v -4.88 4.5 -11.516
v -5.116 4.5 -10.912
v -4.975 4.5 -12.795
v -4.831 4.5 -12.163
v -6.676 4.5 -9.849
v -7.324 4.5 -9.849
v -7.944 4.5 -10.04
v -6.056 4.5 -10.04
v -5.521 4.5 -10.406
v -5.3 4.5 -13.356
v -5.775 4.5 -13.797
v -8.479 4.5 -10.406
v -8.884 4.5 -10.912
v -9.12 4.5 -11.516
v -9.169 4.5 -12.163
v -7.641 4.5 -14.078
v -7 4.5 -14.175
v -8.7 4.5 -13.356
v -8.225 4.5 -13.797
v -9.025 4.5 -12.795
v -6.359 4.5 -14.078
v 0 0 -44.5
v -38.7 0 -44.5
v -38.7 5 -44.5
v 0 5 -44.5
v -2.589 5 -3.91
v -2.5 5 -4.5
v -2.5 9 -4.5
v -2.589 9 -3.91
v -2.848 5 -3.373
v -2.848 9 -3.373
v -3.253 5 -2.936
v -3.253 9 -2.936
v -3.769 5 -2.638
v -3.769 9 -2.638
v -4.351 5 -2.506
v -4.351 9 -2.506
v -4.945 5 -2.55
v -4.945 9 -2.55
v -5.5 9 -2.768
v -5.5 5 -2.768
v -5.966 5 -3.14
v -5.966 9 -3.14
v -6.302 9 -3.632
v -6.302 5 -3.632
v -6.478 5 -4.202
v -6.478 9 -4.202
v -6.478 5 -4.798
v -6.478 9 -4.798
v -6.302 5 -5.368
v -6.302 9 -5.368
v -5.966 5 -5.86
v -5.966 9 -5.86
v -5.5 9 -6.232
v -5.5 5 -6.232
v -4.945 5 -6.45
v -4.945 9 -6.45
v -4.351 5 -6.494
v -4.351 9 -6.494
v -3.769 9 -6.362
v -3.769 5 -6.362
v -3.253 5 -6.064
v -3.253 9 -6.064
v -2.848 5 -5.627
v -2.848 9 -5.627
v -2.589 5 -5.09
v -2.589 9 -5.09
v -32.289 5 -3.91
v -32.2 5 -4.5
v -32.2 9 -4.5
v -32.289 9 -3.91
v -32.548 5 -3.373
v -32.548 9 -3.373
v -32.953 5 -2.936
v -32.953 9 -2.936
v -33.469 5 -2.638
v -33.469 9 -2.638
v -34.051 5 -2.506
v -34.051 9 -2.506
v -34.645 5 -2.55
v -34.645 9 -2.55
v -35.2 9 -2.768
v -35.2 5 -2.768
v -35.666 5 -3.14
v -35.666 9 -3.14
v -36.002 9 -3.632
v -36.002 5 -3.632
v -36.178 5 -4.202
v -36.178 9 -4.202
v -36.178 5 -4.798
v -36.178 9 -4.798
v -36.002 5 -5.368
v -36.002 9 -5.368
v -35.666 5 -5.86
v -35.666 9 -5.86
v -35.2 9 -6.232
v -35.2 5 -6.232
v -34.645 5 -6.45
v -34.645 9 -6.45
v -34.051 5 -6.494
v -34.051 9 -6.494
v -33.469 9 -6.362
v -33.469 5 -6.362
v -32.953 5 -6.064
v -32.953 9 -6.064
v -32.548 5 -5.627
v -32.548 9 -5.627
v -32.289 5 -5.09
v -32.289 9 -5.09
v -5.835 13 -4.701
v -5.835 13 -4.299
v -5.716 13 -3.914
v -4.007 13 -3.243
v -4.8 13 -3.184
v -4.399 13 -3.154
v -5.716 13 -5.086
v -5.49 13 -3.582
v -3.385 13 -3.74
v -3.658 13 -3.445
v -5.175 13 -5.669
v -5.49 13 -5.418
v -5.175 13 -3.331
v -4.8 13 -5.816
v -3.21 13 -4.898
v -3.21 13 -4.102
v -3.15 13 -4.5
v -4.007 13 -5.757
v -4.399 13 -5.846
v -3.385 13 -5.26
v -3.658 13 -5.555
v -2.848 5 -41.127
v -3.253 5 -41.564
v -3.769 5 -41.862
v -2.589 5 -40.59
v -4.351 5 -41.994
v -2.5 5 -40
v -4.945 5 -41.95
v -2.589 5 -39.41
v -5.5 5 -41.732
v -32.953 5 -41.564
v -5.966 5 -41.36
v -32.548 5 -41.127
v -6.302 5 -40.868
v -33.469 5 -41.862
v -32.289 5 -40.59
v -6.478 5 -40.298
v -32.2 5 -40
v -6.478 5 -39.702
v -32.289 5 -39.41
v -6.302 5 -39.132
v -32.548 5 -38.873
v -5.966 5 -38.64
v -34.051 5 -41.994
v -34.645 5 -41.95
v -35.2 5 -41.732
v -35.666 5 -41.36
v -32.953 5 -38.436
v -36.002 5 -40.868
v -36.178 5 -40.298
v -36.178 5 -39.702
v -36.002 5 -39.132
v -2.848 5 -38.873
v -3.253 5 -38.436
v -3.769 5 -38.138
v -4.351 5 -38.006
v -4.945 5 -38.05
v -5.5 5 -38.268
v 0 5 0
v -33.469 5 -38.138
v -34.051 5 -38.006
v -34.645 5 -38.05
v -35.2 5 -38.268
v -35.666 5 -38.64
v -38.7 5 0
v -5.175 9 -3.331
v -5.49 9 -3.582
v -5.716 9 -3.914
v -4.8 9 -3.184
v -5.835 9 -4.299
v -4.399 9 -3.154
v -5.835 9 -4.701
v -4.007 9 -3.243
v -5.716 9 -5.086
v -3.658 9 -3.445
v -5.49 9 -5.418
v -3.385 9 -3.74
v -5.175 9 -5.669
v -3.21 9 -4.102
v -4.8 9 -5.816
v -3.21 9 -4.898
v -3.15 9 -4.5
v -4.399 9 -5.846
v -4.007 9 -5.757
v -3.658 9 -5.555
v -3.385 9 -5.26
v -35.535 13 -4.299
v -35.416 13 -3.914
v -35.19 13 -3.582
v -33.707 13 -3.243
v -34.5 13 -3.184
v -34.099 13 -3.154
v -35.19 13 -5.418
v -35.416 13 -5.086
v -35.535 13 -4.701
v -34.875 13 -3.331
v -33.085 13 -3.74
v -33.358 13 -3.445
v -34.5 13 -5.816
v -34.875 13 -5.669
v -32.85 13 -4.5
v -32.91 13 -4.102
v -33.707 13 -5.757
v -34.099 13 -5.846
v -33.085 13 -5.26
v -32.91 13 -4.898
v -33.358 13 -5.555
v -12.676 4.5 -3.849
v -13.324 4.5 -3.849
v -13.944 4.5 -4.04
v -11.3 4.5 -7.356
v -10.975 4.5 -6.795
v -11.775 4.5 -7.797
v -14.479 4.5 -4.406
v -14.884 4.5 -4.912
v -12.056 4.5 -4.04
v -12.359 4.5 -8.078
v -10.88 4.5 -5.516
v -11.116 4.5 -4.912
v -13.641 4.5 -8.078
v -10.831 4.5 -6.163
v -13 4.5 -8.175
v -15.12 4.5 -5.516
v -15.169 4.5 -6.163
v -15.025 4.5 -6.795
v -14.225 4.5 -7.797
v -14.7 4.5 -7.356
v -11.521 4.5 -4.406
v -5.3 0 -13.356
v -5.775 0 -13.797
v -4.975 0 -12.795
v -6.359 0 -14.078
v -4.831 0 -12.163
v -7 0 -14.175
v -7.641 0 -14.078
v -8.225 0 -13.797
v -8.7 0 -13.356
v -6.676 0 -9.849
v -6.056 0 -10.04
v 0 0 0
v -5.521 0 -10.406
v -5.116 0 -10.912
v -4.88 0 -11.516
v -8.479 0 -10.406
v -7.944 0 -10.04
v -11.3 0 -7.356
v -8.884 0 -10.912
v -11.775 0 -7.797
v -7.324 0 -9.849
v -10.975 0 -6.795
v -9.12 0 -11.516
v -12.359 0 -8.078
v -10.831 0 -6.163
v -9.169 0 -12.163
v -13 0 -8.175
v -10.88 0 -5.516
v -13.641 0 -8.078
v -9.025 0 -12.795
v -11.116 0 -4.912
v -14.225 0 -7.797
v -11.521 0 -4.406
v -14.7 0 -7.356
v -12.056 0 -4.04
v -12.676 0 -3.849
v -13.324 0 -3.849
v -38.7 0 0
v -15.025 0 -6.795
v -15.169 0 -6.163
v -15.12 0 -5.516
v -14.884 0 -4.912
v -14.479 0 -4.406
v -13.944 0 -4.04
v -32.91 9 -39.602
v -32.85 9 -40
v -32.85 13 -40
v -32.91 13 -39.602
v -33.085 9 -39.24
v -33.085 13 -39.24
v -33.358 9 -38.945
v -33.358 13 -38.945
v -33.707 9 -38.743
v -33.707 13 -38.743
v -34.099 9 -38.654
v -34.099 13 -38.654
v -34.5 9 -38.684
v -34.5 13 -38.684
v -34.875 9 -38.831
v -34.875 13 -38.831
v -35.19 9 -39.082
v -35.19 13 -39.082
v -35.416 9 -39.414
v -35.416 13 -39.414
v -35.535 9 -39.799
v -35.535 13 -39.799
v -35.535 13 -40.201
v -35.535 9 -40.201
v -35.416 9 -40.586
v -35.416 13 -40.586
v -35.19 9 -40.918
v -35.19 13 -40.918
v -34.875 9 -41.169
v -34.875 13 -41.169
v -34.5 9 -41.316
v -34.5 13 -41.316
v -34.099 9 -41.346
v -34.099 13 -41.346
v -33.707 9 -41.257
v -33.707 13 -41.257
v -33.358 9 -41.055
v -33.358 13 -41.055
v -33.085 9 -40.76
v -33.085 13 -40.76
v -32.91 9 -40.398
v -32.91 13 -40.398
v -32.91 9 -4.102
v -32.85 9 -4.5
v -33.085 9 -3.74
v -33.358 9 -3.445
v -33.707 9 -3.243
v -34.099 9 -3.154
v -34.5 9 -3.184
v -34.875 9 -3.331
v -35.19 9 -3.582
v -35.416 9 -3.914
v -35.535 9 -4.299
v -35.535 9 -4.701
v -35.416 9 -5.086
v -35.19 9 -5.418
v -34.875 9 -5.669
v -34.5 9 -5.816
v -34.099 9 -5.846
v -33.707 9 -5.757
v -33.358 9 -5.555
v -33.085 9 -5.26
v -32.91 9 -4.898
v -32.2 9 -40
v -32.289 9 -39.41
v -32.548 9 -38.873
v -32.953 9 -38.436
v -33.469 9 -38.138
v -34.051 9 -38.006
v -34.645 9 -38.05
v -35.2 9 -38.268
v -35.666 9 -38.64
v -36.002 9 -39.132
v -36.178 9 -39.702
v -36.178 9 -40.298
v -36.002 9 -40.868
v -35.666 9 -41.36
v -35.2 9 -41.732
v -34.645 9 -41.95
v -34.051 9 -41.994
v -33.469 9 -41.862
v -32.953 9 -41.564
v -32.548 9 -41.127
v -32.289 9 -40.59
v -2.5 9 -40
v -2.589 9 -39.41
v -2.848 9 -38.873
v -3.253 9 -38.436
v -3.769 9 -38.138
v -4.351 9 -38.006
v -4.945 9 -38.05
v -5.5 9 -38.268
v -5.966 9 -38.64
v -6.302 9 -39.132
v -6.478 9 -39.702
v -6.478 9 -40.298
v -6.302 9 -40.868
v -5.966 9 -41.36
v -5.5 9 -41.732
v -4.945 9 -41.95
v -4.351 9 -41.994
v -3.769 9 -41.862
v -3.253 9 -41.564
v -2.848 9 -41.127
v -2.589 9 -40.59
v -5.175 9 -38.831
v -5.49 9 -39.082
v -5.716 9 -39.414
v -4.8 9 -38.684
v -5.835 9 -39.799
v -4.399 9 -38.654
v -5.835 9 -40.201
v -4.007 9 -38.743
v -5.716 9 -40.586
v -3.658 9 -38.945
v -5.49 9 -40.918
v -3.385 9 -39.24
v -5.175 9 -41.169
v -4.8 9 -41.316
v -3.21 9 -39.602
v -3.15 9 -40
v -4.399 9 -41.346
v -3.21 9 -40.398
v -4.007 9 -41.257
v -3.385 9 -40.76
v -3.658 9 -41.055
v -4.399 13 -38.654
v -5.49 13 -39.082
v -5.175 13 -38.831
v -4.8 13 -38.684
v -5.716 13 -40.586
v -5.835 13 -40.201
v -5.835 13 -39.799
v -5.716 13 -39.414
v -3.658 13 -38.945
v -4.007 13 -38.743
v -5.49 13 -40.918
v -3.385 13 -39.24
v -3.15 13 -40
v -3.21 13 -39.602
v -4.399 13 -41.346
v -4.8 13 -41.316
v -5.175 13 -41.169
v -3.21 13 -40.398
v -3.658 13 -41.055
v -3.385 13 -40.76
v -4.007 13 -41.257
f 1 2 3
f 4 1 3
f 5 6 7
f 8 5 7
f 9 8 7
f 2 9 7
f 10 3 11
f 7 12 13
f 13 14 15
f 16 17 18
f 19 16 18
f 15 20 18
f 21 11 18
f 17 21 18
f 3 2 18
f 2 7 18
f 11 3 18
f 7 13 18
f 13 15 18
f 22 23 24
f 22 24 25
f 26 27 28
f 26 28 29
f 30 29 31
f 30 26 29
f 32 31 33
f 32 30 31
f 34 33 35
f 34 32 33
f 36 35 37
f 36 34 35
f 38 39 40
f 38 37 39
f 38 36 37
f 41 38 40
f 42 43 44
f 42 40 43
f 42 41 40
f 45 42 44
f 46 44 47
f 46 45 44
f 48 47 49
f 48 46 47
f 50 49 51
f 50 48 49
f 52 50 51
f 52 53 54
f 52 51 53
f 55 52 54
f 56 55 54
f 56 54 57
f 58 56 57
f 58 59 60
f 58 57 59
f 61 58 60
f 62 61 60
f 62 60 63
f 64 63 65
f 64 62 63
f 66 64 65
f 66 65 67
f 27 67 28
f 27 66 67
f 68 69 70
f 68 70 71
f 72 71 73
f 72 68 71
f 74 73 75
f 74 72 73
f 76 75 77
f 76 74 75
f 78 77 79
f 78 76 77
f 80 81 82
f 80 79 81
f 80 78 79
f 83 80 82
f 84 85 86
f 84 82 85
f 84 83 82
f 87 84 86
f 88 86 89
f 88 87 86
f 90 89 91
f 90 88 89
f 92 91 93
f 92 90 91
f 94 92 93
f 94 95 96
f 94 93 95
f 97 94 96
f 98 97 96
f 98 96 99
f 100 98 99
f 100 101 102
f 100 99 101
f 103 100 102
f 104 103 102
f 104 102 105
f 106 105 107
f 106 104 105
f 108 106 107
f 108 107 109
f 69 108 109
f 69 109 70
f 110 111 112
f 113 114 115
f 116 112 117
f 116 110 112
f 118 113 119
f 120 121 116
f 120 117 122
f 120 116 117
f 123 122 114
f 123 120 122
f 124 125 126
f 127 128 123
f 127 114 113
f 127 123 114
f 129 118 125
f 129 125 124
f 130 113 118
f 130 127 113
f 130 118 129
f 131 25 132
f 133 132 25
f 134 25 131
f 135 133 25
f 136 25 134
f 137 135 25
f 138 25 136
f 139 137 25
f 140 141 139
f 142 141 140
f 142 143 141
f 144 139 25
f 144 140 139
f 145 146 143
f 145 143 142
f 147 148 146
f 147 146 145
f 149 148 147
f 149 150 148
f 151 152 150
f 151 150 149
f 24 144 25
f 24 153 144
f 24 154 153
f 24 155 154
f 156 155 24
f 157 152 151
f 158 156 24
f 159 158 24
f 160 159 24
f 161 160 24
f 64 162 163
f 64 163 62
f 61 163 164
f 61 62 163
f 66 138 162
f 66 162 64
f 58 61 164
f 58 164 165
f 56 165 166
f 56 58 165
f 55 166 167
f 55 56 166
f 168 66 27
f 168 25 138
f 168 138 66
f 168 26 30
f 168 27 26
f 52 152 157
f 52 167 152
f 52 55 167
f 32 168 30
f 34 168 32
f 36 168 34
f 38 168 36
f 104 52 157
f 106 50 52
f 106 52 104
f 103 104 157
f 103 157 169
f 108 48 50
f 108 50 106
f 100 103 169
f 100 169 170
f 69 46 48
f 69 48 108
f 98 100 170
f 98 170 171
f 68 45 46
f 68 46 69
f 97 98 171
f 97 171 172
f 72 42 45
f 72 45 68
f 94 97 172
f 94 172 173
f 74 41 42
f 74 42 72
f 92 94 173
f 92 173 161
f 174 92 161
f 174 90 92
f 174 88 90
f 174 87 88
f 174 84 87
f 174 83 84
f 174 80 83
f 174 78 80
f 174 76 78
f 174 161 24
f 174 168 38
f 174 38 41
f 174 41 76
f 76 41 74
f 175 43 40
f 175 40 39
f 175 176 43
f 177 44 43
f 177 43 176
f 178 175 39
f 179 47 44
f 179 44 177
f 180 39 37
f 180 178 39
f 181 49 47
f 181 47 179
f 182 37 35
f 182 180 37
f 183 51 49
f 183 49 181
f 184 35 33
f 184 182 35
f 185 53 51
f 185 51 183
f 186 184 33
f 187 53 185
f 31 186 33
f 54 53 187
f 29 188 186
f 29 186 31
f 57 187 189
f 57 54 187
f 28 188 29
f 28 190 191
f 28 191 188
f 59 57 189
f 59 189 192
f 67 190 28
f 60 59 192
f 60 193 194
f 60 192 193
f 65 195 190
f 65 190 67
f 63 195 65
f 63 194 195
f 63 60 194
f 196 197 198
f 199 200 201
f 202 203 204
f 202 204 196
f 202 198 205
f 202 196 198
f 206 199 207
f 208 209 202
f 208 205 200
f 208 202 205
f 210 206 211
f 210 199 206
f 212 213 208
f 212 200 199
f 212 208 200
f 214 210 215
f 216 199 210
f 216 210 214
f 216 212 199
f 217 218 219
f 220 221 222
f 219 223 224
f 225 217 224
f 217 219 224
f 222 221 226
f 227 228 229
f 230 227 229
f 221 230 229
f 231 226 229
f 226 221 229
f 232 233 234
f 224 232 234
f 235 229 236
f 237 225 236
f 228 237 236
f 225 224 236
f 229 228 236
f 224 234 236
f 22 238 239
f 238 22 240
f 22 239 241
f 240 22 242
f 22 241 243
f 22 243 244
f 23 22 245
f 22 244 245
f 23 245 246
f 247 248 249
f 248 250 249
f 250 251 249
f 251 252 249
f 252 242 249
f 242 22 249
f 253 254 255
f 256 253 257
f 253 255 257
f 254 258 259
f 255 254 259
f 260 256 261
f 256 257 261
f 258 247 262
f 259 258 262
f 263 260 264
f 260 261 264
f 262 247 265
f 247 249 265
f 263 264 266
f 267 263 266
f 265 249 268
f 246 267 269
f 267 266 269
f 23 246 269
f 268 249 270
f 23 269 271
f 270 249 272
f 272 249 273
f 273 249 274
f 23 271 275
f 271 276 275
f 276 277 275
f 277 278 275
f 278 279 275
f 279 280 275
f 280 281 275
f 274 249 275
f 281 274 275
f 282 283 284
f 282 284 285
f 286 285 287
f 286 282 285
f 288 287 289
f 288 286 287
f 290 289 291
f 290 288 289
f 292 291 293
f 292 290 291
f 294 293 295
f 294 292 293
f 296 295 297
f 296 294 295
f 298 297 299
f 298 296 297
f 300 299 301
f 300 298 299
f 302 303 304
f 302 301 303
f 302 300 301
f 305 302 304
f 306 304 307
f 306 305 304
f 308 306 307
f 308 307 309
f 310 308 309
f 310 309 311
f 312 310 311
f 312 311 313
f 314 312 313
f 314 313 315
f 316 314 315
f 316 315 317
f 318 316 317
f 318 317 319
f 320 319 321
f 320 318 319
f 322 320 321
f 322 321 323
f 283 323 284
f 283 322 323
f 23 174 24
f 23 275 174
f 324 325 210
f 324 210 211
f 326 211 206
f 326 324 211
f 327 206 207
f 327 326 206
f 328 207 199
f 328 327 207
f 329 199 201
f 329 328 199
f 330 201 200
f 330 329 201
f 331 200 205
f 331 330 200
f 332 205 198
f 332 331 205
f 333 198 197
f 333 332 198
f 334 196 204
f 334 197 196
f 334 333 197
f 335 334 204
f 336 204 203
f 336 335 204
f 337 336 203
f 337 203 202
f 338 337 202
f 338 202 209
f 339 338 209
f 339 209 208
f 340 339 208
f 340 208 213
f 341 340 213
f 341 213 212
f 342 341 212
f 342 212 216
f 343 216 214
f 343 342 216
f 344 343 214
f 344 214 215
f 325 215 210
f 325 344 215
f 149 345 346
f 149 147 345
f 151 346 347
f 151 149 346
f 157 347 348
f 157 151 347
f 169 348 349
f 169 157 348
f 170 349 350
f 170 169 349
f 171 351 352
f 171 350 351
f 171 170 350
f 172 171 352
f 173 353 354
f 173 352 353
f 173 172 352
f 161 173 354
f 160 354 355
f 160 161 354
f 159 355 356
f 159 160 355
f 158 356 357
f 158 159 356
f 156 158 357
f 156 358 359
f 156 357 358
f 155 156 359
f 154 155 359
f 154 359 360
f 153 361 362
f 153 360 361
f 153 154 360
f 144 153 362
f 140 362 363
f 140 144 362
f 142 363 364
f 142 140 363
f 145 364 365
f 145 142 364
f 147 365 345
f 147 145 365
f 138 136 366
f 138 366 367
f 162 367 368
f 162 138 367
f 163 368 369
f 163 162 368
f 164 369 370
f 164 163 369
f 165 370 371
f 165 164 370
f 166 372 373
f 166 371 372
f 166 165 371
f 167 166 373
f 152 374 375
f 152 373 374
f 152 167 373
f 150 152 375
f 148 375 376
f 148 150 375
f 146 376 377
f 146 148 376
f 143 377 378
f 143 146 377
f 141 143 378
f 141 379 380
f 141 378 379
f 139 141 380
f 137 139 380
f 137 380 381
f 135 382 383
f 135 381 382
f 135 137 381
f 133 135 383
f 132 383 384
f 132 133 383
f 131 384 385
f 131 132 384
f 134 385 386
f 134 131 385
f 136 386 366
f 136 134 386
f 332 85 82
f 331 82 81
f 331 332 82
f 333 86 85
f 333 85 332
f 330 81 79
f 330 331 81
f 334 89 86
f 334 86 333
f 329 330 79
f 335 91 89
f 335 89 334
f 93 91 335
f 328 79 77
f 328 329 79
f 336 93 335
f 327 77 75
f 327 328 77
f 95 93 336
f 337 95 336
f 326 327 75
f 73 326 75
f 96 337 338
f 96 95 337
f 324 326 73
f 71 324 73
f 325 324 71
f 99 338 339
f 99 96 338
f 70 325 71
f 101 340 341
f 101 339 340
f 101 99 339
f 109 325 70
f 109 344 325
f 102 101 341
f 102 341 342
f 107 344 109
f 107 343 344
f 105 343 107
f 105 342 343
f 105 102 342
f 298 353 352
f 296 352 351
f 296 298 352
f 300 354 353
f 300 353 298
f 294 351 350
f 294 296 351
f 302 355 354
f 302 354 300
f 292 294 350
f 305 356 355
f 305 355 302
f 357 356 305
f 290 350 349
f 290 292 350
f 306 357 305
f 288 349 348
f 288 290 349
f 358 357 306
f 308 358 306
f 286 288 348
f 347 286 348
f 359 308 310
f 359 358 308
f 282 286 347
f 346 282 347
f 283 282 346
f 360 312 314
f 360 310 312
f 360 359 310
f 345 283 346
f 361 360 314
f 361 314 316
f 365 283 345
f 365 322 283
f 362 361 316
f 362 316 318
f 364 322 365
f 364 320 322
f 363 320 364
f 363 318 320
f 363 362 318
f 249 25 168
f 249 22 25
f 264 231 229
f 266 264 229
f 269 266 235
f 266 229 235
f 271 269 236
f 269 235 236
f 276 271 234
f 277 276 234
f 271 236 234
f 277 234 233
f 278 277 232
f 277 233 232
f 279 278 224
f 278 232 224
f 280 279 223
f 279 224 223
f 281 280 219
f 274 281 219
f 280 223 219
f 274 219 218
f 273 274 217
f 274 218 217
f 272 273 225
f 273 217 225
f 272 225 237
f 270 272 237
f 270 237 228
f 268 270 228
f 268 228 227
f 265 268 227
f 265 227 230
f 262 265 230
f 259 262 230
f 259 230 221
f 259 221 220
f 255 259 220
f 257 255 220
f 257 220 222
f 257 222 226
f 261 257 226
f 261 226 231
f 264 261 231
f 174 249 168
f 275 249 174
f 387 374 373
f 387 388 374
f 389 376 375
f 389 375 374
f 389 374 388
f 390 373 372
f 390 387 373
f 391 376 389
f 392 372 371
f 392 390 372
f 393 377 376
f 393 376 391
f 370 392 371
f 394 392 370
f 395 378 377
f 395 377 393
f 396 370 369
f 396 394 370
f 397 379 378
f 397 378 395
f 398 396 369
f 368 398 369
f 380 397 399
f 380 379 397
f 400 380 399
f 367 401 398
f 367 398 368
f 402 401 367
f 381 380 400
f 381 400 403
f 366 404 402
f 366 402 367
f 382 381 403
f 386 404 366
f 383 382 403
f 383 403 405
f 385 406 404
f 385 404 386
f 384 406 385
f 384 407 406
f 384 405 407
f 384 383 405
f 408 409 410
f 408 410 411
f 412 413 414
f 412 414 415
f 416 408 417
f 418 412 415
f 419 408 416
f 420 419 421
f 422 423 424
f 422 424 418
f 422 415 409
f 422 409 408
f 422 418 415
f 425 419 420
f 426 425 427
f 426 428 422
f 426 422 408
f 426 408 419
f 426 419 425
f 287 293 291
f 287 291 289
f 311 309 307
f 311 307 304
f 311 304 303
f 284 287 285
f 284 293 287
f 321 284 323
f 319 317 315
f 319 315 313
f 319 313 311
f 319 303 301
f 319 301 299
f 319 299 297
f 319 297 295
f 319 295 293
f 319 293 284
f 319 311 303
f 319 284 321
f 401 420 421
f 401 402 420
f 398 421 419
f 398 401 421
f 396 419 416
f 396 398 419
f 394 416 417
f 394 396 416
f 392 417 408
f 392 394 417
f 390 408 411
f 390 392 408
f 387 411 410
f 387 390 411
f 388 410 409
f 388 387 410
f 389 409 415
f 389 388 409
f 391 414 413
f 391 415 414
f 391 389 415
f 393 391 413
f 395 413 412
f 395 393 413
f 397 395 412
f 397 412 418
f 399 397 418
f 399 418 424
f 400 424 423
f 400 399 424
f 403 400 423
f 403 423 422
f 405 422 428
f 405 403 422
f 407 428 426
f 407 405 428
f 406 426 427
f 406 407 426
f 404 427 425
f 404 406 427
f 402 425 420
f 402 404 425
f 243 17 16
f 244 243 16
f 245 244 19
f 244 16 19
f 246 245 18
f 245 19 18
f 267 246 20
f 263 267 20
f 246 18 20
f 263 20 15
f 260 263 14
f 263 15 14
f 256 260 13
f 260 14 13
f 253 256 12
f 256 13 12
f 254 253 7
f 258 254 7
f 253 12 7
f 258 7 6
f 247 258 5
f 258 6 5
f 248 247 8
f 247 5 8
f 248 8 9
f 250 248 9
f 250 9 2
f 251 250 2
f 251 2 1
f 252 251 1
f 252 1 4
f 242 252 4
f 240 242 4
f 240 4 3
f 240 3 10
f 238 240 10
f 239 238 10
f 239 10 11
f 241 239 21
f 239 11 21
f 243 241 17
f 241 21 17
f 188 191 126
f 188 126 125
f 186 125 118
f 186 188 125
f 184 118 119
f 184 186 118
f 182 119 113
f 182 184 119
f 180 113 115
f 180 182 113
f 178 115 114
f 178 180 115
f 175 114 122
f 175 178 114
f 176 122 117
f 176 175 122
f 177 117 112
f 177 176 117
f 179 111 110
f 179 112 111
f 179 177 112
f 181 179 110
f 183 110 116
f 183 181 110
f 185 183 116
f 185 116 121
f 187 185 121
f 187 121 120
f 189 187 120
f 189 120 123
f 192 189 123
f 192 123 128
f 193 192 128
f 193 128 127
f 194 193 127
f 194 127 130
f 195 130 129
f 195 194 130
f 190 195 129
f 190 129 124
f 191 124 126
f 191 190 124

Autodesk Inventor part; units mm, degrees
ref_plane "YZ Plane" through (0, 0, 0) normal (1, 0, 0) x (0, 1, 0)
ref_plane "XZ Plane" through (0, 0, 0) normal (0, 1, 0) x (-1, 0, 0)
ref_plane "XY Plane" through (0, 0, 0) normal (0, 0, 1) x (1, 0, 0)
sketch "Sketch1" plane through (0, 0, 0) normal (0, 1, 0) x (-1, 0, 0)
  line L0 (0, 0) -> (38.7, 0)
  line L1 (38.7, 0) -> (38.7, -44.5)
  line L2 (38.7, -44.5) -> (0, -44.5)
  line L3 (0, -44.5) -> (0, 0)
  line L4 (38.7, -22.25) -> (0, -22.25)
  line L5 (19.35, 0) -> (19.35, -44.5)
  dimension "d0" = 38.7
  dimension "d1" = 44.5
extrude "Extrusion1" add sketch "Sketch1" along normal blind 5
sketch "Sketch2" plane through (0, 5, 0) normal (0, 1, 0) x (1, 0, 0)
  circle A0 centre (-34.2, 4.5) radius 2
  line L0 (-38.7, 0) -> (0, 0) projected
  line L1 (-38.7, 44.5) -> (-38.7, 0) projected
  circle A1 centre (-34.2, 40) radius 2
  line L2 (0, 44.5) -> (-38.7, 44.5) projected
  circle A2 centre (-4.5, 4.5) radius 2
  line L3 (0, 0) -> (0, 44.5) projected
  circle A3 centre (-4.5, 40) radius 2
  dimension "d16" = 4
  dimension "d17" = 4.5
  dimension "d18" = 4.5
  dimension "d19" = 4
  dimension "d20" = 4.5
  dimension "d21" = 4.5
  dimension "d22" = 4
  dimension "d23" = 4.5
  dimension "d24" = 4.5
  dimension "d25" = 4
  dimension "d26" = 4.5
  dimension "d27" = 4.5
extrude "Extrusion2" add sketch "Sketch2" along normal blind 4 contours A0 | A1 | A2 | A3
sketch "Sketch3" plane through (-34.2, 9, -40) normal (0, 1, 0) x (1, 0, 0)
  circle A0 centre (0, 0) radius 1.35
  circle A1 centre (29.7, 0) radius 2 projected
  circle A2 centre (29.7, 0) radius 1.35
  circle A3 centre (29.7, -35.5) radius 2 projected
  circle A4 centre (29.7, -35.5) radius 1.35
  circle A5 centre (0, -35.5) radius 2 projected
  circle A6 centre (0, -35.5) radius 1.35
  point P0 (34.2, -40)
  dimension "d30" = 2.7
  dimension "d31" = 2.7
  dimension "d32" = 2.7
  dimension "d33" = 2.7
extrude "Extrusion3" add sketch "Sketch3" along normal blind 4 contours A0 | A2 | A4 | A6
sketch "Sketch4" plane through (0, 0, 0) normal (0, -1, 0) x (1, 0, 0)
  circle A0 centre (-13, -6) radius 2.175
  line L0 (0, 0) -> (0, -44.5) projected
  line L1 (-38.7, 0) -> (0, 0) projected
  line L2 (-13, -6) -> (-13, -12)
  line L3 (-13, -12) -> (-7, -12)
  circle A1 centre (-7, -12) radius 2.175
  dimension "d36" = 4.35
  dimension "d37" = 13
  dimension "d38" = 6
  dimension "d39" = 6
  dimension "d40" = 6
  dimension "d41" = 4.35
hole "Hole1" at (-13, 0, -6) at (-7, 0, -12) direction (0, 1, 0) diameter 4.35 depth 4.5
properties part number "PCBMount"
